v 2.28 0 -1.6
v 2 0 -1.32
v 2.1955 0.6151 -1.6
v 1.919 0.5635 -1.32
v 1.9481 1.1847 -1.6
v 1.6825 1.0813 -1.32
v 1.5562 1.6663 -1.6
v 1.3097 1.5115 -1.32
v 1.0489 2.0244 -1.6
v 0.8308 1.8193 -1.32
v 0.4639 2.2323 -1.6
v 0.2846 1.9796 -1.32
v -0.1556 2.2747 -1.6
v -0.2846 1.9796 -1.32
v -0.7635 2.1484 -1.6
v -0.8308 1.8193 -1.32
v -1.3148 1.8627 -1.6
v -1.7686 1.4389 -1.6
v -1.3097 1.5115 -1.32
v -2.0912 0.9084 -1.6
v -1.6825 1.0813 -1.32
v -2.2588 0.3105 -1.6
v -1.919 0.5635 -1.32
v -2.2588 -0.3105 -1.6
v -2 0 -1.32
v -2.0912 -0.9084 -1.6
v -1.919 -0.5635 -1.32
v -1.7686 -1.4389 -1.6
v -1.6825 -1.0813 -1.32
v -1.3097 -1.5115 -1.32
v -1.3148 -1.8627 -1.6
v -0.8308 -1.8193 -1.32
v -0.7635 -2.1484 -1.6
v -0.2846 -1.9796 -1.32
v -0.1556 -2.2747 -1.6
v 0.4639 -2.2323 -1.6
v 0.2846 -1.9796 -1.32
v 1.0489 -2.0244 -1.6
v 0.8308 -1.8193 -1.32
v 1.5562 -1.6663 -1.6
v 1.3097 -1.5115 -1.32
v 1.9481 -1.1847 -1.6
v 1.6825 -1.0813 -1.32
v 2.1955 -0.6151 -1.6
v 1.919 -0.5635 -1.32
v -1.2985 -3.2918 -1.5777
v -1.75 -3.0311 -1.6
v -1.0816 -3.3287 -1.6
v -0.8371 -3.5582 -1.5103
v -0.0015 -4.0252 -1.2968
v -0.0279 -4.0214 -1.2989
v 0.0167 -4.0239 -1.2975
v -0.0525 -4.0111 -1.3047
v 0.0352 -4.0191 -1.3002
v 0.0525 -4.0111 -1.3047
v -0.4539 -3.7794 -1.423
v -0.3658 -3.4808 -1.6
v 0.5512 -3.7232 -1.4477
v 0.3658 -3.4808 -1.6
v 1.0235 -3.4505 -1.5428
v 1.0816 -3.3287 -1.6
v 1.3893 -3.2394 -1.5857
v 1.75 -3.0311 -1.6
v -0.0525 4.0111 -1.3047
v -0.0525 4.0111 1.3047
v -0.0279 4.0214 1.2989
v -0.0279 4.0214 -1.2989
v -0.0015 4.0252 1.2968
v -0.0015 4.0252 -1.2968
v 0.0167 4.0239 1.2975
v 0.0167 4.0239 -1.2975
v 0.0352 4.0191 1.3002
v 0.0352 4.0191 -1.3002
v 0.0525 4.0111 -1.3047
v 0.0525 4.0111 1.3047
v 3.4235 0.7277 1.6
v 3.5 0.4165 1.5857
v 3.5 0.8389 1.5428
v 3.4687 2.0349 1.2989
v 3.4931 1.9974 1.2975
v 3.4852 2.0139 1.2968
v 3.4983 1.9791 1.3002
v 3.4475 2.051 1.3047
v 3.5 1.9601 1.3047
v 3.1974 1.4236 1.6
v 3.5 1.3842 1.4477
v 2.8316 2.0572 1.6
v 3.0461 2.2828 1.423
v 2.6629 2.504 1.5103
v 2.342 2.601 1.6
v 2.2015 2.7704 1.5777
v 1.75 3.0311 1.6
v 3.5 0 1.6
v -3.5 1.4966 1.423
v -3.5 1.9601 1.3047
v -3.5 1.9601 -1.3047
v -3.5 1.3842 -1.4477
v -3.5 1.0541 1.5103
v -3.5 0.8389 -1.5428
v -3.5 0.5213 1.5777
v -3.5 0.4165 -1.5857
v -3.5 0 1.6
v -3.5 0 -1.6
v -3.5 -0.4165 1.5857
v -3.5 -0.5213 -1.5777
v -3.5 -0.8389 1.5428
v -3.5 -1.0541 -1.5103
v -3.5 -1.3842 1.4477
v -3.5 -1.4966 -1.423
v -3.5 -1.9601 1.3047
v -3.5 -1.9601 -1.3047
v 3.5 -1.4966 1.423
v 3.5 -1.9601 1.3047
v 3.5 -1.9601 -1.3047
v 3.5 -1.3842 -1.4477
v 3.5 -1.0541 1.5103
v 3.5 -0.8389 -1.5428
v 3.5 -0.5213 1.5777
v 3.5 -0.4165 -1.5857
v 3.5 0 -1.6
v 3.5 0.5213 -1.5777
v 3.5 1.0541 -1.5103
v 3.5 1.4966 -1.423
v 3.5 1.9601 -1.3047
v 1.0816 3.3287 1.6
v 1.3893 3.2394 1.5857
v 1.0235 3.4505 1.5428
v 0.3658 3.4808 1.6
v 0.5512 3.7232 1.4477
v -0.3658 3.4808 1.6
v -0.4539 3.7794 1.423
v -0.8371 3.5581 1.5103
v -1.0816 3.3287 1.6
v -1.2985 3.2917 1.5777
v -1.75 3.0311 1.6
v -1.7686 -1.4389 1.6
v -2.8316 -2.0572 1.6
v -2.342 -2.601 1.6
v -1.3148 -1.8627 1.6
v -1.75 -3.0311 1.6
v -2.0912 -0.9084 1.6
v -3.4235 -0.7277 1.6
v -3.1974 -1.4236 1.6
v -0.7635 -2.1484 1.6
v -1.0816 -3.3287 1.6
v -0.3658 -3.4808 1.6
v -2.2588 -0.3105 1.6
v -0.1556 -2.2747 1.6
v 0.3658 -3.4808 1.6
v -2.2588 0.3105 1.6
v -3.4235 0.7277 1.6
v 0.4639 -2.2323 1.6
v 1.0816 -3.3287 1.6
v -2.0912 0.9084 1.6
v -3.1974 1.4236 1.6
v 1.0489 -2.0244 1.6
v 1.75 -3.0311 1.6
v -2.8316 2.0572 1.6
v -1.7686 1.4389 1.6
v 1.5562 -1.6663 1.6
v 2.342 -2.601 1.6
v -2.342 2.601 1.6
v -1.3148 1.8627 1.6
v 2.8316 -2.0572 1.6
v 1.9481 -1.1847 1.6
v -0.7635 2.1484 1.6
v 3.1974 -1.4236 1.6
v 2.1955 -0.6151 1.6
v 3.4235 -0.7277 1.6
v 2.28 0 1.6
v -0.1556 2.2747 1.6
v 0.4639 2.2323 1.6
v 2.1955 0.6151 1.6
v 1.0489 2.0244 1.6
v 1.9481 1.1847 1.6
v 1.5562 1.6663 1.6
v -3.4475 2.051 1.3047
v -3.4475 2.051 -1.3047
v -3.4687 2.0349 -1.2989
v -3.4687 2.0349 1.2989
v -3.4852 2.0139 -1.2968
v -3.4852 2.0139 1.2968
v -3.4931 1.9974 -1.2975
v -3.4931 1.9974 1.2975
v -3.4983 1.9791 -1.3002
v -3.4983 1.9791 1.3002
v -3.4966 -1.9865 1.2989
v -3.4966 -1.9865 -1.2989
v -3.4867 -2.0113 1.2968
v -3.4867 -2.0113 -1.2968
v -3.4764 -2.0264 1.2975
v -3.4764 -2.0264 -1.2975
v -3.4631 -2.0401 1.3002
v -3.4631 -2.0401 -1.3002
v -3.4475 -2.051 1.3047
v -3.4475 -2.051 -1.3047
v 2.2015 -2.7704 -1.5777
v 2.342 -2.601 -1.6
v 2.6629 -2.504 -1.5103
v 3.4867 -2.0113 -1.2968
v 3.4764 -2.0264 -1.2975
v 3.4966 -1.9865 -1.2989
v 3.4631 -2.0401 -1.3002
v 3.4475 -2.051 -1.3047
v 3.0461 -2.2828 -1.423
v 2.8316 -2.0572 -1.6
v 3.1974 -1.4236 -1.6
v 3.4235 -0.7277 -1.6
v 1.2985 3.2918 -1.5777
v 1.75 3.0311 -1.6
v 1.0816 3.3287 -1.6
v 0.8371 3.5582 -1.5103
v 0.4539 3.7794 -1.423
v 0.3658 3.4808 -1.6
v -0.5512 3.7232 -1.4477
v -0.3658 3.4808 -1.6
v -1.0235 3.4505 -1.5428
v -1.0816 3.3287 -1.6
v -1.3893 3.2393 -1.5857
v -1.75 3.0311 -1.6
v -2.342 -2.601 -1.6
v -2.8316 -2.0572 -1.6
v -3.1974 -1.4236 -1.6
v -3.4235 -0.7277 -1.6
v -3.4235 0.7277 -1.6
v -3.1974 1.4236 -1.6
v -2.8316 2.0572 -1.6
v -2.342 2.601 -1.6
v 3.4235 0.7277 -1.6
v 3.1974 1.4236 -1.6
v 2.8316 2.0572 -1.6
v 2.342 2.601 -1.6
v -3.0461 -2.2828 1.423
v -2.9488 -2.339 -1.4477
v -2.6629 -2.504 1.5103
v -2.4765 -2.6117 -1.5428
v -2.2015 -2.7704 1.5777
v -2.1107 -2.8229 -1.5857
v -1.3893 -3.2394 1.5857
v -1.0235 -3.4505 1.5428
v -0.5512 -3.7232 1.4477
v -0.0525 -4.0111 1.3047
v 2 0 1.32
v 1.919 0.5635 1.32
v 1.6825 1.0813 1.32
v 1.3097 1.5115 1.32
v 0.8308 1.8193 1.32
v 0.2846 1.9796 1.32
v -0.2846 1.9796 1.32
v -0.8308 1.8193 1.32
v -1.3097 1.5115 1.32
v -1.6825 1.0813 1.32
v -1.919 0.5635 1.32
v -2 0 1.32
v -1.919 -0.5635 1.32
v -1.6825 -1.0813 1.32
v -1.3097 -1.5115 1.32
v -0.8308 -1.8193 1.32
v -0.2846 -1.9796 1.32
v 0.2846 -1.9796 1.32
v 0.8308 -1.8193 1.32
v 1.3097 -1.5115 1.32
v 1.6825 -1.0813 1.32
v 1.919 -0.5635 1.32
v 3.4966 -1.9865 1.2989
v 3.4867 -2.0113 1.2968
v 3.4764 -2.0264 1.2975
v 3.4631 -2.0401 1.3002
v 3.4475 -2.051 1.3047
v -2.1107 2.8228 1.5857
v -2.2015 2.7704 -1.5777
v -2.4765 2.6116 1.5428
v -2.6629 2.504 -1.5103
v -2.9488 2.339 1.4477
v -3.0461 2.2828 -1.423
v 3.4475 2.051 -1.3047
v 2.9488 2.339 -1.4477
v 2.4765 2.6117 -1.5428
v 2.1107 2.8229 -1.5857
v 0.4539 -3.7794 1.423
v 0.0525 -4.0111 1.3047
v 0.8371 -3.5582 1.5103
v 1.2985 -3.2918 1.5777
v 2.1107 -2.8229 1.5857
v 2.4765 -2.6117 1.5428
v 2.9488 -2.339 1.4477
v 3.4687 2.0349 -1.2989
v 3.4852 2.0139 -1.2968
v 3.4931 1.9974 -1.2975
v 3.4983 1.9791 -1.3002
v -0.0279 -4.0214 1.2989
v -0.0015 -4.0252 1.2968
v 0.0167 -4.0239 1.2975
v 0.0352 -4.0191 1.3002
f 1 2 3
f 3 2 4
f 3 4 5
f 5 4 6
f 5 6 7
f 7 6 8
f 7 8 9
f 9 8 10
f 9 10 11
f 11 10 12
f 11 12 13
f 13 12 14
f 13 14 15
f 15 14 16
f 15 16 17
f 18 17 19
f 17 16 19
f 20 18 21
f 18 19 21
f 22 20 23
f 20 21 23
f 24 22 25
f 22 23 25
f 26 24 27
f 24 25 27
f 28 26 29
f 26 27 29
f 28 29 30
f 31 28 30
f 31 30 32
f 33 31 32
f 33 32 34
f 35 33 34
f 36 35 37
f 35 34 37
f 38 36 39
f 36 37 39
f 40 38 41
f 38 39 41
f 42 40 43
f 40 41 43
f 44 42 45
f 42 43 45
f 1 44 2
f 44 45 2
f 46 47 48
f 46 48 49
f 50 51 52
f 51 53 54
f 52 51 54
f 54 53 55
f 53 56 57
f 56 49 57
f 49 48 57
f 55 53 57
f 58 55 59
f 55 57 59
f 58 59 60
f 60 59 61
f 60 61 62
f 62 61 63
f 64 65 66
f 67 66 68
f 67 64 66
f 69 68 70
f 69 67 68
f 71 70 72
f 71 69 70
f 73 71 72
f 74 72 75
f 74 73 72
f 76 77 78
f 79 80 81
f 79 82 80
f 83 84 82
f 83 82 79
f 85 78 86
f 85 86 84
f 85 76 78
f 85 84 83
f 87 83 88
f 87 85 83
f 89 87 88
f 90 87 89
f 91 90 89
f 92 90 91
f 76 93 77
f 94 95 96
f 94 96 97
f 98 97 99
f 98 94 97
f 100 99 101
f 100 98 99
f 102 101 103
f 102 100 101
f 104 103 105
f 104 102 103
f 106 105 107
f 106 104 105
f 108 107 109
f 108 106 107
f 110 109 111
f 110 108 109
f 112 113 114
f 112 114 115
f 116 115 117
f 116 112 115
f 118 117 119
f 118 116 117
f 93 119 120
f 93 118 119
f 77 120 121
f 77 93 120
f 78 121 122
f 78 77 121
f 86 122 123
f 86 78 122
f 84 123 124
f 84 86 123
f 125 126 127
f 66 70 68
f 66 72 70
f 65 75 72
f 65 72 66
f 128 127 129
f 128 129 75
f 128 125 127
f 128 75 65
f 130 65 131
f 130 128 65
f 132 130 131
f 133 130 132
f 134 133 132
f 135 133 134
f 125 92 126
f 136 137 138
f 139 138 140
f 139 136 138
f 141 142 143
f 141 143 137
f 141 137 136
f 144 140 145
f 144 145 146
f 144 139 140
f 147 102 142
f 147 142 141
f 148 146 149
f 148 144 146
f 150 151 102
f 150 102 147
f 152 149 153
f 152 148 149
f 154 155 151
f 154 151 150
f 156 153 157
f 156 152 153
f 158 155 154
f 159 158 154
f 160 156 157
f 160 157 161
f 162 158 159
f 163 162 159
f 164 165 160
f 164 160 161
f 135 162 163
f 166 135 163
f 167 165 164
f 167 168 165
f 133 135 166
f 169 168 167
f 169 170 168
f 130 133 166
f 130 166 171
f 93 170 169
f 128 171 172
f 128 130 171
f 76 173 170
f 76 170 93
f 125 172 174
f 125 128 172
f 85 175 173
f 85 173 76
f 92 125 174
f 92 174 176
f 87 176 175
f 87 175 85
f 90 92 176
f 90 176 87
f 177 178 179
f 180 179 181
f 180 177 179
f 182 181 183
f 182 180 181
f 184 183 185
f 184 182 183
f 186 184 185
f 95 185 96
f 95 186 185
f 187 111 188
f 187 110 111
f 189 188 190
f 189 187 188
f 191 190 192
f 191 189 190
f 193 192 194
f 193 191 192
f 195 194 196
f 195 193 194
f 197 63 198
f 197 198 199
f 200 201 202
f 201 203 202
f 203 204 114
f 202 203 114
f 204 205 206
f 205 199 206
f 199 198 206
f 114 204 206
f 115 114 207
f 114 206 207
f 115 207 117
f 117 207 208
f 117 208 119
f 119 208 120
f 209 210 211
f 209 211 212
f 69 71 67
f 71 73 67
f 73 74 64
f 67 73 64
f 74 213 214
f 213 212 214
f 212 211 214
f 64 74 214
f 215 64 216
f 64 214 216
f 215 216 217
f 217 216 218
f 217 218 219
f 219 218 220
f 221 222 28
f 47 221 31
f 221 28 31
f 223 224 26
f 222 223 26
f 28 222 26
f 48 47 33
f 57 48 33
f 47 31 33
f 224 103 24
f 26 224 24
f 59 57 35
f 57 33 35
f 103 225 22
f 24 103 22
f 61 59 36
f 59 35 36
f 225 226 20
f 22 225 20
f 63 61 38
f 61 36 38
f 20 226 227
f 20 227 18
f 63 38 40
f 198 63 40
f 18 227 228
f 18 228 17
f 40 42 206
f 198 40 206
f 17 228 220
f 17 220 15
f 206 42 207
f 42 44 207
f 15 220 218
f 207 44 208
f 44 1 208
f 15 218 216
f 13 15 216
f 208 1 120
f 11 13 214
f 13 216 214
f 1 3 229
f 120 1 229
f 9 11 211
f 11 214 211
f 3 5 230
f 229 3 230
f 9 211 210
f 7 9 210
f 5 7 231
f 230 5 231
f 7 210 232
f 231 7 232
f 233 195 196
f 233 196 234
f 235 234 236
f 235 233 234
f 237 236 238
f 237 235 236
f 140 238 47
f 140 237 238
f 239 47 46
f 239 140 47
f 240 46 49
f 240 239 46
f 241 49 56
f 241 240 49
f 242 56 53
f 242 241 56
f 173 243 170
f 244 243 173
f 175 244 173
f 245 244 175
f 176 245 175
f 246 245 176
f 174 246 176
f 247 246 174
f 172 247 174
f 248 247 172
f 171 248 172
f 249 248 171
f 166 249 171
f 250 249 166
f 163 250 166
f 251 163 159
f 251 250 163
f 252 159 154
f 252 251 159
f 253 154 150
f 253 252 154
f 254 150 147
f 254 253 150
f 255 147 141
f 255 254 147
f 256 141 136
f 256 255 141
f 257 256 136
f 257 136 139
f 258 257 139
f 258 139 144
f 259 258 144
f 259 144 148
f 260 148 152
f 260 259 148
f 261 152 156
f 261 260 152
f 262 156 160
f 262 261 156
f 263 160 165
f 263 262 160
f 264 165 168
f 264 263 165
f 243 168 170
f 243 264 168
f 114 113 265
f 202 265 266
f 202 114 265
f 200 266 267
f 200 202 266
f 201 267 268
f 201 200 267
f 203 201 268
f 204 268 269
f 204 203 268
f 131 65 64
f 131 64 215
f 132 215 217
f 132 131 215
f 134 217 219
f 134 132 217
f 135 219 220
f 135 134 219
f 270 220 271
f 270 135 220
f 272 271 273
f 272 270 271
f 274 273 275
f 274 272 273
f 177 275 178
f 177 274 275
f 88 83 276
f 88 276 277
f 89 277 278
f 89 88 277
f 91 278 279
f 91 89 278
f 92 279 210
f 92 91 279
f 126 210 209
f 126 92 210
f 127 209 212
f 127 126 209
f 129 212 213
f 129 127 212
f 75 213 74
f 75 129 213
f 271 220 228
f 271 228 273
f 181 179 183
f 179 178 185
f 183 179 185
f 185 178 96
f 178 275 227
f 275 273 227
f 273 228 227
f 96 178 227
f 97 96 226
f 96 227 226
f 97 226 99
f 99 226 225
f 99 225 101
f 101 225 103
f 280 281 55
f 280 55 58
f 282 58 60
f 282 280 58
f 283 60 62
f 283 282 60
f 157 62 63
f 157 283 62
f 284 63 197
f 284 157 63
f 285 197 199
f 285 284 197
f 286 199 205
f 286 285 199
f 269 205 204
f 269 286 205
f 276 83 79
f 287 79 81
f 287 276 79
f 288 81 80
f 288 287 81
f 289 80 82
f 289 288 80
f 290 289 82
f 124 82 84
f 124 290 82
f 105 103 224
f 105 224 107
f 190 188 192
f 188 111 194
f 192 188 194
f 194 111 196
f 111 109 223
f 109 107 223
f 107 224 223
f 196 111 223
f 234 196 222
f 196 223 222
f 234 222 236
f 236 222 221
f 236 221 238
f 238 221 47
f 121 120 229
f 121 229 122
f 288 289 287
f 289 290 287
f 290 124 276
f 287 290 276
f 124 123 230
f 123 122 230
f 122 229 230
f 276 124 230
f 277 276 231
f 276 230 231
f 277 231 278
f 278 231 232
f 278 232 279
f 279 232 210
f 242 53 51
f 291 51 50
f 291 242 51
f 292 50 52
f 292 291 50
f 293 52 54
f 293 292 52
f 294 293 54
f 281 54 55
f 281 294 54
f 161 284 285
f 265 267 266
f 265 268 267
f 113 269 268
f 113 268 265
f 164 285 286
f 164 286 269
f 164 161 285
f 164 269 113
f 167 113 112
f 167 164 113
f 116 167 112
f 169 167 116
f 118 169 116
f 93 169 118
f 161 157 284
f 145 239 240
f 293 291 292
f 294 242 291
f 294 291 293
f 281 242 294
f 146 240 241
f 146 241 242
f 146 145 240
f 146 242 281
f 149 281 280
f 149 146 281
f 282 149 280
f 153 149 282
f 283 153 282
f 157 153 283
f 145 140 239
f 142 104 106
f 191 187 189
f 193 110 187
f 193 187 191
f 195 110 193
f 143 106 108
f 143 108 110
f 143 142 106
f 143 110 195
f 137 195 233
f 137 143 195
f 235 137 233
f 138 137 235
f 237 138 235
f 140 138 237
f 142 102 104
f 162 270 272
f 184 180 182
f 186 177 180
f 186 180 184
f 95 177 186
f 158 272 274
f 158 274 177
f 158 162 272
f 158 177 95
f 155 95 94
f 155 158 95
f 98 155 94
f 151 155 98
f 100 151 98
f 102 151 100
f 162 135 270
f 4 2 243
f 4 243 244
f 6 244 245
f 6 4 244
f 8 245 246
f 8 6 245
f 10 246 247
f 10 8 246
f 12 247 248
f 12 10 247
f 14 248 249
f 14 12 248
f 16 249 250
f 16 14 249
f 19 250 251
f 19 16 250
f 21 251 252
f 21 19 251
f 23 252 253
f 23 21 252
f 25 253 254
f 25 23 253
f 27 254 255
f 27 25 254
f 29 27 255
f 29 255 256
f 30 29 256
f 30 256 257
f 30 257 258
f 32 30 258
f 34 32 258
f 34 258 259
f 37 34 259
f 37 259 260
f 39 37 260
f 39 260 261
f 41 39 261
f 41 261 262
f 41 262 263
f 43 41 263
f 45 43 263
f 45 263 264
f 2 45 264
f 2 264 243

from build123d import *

# Parameters (mm, degrees)
SKETCH3_R           = 2
BOSS_EXTRUDE1_DEPTH = 1.6
SKETCH4_OUTSIDE_W   = 36.28
SKETCH4_OUTSIDE_H   = 37.362
SKETCH4_OUTSIDE_R   = 3.5
CUT_EXTRUDE1_DEPTH  = 7.23083729
CUT_EXTRUDE1_DRAFT  = -60
CUT_EXTRUDE2_START  = -3.2
SKETCH4_2_OUTSIDE_W = 47.366
SKETCH4_2_OUTSIDE_H = 48.448
SKETCH4_2_OUTSIDE_R = 3.5
CUT_EXTRUDE2_DEPTH  = 10.43083729
CUT_EXTRUDE2_DRAFT  = 60
FILLET1_R           = 0.105
CHAMFER1_SIZE       = 0.28


with BuildPart() as part:
    # Sketch3 → Boss-Extrude1 (new, symmetric)
    with BuildSketch(Plane.XY):
        Polygon((0, 4.041451884), (-3.5, 2.020725942), (-3.5, -2.020725942), (0, -4.041451884), (3.5, -2.020725942), (3.5, 2.020725942), align=None)
        Circle(SKETCH3_R, mode=Mode.SUBTRACT)
    extrude(amount=BOSS_EXTRUDE1_DEPTH, both=True)


with BuildPart() as cut_extrude1_tool:
    # Sketch4 outside → Cut-Extrude1 (with draft: the straight prism first)
    with BuildSketch(Plane.XY.offset(1.6)):
        Rectangle(SKETCH4_OUTSIDE_W, SKETCH4_OUTSIDE_H)
        Circle(SKETCH4_OUTSIDE_R, mode=Mode.SUBTRACT)
    extrude(amount=-CUT_EXTRUDE1_DEPTH)
    # Cut-Extrude1: the draft: its side faces are tilted about the plane it starts from
    cut_extrude1_sides = [cut_extrude1_tool.faces().sort_by_distance(p)[0] for p in [
        (0, -18.681, -2.015418645),
        (18.14, 0, -2.015418645),
        (0, 18.681, -2.015418645),
        (-18.14, 0, -2.015418645),
        (-3.5, 0, -2.015418645),
    ]]
    draft(cut_extrude1_sides, Plane.XY.offset(1.6), CUT_EXTRUDE1_DRAFT)


with BuildPart() as part_1:
    add(part.part)

    # Cut-Extrude1: cut by cut_extrude1_tool
    add(cut_extrude1_tool.part, mode=Mode.SUBTRACT)


with BuildPart() as cut_extrude2_tool:
    # Sketch4<2> outside → Cut-Extrude2 (with draft: the straight prism first)
    with BuildSketch(Plane.XY.offset(1.6).offset(CUT_EXTRUDE2_START)):
        Rectangle(SKETCH4_2_OUTSIDE_W, SKETCH4_2_OUTSIDE_H)
        Circle(SKETCH4_2_OUTSIDE_R, mode=Mode.SUBTRACT)
    extrude(amount=CUT_EXTRUDE2_DEPTH)
    # Cut-Extrude2: the draft: its side faces are tilted about the plane it starts from
    cut_extrude2_sides = [cut_extrude2_tool.faces().sort_by_distance(p)[0] for p in [
        (0, -24.224, 3.615418645),
        (23.683, 0, 3.615418645),
        (0, 24.224, 3.615418645),
        (-23.683, 0, 3.615418645),
        (-3.5, 0, 3.615418645),
    ]]
    draft(cut_extrude2_sides, Plane.XY.offset(1.6).offset(CUT_EXTRUDE2_START), CUT_EXTRUDE2_DRAFT)


with BuildPart() as part_2:
    add(part_1.part)

    # Cut-Extrude2: cut by cut_extrude2_tool
    add(cut_extrude2_tool.part, mode=Mode.SUBTRACT)

    # Fillet1
    fillet1_edges = [part_2.edges().sort_by_distance(p)[0] for p in [
        (3.5, -2.020725942, 0),
        (0, -4.041451884, 0),
        (-3.5, -2.020725942, 0),
        (-3.5, 2.020725942, 0),
        (0, 4.041451884, 0),
        (3.5, 2.020725942, 0),
    ]]
    fillet(fillet1_edges, radius=FILLET1_R)

    # Chamfer1
    chamfer1_edges = [part_2.edges().sort_by_distance(p)[0] for p in [
        (-2, 0, -1.6),
        (-2, 0, 1.6),
    ]]
    chamfer(chamfer1_edges, length=CHAMFER1_SIZE)


solid = part_2.part
